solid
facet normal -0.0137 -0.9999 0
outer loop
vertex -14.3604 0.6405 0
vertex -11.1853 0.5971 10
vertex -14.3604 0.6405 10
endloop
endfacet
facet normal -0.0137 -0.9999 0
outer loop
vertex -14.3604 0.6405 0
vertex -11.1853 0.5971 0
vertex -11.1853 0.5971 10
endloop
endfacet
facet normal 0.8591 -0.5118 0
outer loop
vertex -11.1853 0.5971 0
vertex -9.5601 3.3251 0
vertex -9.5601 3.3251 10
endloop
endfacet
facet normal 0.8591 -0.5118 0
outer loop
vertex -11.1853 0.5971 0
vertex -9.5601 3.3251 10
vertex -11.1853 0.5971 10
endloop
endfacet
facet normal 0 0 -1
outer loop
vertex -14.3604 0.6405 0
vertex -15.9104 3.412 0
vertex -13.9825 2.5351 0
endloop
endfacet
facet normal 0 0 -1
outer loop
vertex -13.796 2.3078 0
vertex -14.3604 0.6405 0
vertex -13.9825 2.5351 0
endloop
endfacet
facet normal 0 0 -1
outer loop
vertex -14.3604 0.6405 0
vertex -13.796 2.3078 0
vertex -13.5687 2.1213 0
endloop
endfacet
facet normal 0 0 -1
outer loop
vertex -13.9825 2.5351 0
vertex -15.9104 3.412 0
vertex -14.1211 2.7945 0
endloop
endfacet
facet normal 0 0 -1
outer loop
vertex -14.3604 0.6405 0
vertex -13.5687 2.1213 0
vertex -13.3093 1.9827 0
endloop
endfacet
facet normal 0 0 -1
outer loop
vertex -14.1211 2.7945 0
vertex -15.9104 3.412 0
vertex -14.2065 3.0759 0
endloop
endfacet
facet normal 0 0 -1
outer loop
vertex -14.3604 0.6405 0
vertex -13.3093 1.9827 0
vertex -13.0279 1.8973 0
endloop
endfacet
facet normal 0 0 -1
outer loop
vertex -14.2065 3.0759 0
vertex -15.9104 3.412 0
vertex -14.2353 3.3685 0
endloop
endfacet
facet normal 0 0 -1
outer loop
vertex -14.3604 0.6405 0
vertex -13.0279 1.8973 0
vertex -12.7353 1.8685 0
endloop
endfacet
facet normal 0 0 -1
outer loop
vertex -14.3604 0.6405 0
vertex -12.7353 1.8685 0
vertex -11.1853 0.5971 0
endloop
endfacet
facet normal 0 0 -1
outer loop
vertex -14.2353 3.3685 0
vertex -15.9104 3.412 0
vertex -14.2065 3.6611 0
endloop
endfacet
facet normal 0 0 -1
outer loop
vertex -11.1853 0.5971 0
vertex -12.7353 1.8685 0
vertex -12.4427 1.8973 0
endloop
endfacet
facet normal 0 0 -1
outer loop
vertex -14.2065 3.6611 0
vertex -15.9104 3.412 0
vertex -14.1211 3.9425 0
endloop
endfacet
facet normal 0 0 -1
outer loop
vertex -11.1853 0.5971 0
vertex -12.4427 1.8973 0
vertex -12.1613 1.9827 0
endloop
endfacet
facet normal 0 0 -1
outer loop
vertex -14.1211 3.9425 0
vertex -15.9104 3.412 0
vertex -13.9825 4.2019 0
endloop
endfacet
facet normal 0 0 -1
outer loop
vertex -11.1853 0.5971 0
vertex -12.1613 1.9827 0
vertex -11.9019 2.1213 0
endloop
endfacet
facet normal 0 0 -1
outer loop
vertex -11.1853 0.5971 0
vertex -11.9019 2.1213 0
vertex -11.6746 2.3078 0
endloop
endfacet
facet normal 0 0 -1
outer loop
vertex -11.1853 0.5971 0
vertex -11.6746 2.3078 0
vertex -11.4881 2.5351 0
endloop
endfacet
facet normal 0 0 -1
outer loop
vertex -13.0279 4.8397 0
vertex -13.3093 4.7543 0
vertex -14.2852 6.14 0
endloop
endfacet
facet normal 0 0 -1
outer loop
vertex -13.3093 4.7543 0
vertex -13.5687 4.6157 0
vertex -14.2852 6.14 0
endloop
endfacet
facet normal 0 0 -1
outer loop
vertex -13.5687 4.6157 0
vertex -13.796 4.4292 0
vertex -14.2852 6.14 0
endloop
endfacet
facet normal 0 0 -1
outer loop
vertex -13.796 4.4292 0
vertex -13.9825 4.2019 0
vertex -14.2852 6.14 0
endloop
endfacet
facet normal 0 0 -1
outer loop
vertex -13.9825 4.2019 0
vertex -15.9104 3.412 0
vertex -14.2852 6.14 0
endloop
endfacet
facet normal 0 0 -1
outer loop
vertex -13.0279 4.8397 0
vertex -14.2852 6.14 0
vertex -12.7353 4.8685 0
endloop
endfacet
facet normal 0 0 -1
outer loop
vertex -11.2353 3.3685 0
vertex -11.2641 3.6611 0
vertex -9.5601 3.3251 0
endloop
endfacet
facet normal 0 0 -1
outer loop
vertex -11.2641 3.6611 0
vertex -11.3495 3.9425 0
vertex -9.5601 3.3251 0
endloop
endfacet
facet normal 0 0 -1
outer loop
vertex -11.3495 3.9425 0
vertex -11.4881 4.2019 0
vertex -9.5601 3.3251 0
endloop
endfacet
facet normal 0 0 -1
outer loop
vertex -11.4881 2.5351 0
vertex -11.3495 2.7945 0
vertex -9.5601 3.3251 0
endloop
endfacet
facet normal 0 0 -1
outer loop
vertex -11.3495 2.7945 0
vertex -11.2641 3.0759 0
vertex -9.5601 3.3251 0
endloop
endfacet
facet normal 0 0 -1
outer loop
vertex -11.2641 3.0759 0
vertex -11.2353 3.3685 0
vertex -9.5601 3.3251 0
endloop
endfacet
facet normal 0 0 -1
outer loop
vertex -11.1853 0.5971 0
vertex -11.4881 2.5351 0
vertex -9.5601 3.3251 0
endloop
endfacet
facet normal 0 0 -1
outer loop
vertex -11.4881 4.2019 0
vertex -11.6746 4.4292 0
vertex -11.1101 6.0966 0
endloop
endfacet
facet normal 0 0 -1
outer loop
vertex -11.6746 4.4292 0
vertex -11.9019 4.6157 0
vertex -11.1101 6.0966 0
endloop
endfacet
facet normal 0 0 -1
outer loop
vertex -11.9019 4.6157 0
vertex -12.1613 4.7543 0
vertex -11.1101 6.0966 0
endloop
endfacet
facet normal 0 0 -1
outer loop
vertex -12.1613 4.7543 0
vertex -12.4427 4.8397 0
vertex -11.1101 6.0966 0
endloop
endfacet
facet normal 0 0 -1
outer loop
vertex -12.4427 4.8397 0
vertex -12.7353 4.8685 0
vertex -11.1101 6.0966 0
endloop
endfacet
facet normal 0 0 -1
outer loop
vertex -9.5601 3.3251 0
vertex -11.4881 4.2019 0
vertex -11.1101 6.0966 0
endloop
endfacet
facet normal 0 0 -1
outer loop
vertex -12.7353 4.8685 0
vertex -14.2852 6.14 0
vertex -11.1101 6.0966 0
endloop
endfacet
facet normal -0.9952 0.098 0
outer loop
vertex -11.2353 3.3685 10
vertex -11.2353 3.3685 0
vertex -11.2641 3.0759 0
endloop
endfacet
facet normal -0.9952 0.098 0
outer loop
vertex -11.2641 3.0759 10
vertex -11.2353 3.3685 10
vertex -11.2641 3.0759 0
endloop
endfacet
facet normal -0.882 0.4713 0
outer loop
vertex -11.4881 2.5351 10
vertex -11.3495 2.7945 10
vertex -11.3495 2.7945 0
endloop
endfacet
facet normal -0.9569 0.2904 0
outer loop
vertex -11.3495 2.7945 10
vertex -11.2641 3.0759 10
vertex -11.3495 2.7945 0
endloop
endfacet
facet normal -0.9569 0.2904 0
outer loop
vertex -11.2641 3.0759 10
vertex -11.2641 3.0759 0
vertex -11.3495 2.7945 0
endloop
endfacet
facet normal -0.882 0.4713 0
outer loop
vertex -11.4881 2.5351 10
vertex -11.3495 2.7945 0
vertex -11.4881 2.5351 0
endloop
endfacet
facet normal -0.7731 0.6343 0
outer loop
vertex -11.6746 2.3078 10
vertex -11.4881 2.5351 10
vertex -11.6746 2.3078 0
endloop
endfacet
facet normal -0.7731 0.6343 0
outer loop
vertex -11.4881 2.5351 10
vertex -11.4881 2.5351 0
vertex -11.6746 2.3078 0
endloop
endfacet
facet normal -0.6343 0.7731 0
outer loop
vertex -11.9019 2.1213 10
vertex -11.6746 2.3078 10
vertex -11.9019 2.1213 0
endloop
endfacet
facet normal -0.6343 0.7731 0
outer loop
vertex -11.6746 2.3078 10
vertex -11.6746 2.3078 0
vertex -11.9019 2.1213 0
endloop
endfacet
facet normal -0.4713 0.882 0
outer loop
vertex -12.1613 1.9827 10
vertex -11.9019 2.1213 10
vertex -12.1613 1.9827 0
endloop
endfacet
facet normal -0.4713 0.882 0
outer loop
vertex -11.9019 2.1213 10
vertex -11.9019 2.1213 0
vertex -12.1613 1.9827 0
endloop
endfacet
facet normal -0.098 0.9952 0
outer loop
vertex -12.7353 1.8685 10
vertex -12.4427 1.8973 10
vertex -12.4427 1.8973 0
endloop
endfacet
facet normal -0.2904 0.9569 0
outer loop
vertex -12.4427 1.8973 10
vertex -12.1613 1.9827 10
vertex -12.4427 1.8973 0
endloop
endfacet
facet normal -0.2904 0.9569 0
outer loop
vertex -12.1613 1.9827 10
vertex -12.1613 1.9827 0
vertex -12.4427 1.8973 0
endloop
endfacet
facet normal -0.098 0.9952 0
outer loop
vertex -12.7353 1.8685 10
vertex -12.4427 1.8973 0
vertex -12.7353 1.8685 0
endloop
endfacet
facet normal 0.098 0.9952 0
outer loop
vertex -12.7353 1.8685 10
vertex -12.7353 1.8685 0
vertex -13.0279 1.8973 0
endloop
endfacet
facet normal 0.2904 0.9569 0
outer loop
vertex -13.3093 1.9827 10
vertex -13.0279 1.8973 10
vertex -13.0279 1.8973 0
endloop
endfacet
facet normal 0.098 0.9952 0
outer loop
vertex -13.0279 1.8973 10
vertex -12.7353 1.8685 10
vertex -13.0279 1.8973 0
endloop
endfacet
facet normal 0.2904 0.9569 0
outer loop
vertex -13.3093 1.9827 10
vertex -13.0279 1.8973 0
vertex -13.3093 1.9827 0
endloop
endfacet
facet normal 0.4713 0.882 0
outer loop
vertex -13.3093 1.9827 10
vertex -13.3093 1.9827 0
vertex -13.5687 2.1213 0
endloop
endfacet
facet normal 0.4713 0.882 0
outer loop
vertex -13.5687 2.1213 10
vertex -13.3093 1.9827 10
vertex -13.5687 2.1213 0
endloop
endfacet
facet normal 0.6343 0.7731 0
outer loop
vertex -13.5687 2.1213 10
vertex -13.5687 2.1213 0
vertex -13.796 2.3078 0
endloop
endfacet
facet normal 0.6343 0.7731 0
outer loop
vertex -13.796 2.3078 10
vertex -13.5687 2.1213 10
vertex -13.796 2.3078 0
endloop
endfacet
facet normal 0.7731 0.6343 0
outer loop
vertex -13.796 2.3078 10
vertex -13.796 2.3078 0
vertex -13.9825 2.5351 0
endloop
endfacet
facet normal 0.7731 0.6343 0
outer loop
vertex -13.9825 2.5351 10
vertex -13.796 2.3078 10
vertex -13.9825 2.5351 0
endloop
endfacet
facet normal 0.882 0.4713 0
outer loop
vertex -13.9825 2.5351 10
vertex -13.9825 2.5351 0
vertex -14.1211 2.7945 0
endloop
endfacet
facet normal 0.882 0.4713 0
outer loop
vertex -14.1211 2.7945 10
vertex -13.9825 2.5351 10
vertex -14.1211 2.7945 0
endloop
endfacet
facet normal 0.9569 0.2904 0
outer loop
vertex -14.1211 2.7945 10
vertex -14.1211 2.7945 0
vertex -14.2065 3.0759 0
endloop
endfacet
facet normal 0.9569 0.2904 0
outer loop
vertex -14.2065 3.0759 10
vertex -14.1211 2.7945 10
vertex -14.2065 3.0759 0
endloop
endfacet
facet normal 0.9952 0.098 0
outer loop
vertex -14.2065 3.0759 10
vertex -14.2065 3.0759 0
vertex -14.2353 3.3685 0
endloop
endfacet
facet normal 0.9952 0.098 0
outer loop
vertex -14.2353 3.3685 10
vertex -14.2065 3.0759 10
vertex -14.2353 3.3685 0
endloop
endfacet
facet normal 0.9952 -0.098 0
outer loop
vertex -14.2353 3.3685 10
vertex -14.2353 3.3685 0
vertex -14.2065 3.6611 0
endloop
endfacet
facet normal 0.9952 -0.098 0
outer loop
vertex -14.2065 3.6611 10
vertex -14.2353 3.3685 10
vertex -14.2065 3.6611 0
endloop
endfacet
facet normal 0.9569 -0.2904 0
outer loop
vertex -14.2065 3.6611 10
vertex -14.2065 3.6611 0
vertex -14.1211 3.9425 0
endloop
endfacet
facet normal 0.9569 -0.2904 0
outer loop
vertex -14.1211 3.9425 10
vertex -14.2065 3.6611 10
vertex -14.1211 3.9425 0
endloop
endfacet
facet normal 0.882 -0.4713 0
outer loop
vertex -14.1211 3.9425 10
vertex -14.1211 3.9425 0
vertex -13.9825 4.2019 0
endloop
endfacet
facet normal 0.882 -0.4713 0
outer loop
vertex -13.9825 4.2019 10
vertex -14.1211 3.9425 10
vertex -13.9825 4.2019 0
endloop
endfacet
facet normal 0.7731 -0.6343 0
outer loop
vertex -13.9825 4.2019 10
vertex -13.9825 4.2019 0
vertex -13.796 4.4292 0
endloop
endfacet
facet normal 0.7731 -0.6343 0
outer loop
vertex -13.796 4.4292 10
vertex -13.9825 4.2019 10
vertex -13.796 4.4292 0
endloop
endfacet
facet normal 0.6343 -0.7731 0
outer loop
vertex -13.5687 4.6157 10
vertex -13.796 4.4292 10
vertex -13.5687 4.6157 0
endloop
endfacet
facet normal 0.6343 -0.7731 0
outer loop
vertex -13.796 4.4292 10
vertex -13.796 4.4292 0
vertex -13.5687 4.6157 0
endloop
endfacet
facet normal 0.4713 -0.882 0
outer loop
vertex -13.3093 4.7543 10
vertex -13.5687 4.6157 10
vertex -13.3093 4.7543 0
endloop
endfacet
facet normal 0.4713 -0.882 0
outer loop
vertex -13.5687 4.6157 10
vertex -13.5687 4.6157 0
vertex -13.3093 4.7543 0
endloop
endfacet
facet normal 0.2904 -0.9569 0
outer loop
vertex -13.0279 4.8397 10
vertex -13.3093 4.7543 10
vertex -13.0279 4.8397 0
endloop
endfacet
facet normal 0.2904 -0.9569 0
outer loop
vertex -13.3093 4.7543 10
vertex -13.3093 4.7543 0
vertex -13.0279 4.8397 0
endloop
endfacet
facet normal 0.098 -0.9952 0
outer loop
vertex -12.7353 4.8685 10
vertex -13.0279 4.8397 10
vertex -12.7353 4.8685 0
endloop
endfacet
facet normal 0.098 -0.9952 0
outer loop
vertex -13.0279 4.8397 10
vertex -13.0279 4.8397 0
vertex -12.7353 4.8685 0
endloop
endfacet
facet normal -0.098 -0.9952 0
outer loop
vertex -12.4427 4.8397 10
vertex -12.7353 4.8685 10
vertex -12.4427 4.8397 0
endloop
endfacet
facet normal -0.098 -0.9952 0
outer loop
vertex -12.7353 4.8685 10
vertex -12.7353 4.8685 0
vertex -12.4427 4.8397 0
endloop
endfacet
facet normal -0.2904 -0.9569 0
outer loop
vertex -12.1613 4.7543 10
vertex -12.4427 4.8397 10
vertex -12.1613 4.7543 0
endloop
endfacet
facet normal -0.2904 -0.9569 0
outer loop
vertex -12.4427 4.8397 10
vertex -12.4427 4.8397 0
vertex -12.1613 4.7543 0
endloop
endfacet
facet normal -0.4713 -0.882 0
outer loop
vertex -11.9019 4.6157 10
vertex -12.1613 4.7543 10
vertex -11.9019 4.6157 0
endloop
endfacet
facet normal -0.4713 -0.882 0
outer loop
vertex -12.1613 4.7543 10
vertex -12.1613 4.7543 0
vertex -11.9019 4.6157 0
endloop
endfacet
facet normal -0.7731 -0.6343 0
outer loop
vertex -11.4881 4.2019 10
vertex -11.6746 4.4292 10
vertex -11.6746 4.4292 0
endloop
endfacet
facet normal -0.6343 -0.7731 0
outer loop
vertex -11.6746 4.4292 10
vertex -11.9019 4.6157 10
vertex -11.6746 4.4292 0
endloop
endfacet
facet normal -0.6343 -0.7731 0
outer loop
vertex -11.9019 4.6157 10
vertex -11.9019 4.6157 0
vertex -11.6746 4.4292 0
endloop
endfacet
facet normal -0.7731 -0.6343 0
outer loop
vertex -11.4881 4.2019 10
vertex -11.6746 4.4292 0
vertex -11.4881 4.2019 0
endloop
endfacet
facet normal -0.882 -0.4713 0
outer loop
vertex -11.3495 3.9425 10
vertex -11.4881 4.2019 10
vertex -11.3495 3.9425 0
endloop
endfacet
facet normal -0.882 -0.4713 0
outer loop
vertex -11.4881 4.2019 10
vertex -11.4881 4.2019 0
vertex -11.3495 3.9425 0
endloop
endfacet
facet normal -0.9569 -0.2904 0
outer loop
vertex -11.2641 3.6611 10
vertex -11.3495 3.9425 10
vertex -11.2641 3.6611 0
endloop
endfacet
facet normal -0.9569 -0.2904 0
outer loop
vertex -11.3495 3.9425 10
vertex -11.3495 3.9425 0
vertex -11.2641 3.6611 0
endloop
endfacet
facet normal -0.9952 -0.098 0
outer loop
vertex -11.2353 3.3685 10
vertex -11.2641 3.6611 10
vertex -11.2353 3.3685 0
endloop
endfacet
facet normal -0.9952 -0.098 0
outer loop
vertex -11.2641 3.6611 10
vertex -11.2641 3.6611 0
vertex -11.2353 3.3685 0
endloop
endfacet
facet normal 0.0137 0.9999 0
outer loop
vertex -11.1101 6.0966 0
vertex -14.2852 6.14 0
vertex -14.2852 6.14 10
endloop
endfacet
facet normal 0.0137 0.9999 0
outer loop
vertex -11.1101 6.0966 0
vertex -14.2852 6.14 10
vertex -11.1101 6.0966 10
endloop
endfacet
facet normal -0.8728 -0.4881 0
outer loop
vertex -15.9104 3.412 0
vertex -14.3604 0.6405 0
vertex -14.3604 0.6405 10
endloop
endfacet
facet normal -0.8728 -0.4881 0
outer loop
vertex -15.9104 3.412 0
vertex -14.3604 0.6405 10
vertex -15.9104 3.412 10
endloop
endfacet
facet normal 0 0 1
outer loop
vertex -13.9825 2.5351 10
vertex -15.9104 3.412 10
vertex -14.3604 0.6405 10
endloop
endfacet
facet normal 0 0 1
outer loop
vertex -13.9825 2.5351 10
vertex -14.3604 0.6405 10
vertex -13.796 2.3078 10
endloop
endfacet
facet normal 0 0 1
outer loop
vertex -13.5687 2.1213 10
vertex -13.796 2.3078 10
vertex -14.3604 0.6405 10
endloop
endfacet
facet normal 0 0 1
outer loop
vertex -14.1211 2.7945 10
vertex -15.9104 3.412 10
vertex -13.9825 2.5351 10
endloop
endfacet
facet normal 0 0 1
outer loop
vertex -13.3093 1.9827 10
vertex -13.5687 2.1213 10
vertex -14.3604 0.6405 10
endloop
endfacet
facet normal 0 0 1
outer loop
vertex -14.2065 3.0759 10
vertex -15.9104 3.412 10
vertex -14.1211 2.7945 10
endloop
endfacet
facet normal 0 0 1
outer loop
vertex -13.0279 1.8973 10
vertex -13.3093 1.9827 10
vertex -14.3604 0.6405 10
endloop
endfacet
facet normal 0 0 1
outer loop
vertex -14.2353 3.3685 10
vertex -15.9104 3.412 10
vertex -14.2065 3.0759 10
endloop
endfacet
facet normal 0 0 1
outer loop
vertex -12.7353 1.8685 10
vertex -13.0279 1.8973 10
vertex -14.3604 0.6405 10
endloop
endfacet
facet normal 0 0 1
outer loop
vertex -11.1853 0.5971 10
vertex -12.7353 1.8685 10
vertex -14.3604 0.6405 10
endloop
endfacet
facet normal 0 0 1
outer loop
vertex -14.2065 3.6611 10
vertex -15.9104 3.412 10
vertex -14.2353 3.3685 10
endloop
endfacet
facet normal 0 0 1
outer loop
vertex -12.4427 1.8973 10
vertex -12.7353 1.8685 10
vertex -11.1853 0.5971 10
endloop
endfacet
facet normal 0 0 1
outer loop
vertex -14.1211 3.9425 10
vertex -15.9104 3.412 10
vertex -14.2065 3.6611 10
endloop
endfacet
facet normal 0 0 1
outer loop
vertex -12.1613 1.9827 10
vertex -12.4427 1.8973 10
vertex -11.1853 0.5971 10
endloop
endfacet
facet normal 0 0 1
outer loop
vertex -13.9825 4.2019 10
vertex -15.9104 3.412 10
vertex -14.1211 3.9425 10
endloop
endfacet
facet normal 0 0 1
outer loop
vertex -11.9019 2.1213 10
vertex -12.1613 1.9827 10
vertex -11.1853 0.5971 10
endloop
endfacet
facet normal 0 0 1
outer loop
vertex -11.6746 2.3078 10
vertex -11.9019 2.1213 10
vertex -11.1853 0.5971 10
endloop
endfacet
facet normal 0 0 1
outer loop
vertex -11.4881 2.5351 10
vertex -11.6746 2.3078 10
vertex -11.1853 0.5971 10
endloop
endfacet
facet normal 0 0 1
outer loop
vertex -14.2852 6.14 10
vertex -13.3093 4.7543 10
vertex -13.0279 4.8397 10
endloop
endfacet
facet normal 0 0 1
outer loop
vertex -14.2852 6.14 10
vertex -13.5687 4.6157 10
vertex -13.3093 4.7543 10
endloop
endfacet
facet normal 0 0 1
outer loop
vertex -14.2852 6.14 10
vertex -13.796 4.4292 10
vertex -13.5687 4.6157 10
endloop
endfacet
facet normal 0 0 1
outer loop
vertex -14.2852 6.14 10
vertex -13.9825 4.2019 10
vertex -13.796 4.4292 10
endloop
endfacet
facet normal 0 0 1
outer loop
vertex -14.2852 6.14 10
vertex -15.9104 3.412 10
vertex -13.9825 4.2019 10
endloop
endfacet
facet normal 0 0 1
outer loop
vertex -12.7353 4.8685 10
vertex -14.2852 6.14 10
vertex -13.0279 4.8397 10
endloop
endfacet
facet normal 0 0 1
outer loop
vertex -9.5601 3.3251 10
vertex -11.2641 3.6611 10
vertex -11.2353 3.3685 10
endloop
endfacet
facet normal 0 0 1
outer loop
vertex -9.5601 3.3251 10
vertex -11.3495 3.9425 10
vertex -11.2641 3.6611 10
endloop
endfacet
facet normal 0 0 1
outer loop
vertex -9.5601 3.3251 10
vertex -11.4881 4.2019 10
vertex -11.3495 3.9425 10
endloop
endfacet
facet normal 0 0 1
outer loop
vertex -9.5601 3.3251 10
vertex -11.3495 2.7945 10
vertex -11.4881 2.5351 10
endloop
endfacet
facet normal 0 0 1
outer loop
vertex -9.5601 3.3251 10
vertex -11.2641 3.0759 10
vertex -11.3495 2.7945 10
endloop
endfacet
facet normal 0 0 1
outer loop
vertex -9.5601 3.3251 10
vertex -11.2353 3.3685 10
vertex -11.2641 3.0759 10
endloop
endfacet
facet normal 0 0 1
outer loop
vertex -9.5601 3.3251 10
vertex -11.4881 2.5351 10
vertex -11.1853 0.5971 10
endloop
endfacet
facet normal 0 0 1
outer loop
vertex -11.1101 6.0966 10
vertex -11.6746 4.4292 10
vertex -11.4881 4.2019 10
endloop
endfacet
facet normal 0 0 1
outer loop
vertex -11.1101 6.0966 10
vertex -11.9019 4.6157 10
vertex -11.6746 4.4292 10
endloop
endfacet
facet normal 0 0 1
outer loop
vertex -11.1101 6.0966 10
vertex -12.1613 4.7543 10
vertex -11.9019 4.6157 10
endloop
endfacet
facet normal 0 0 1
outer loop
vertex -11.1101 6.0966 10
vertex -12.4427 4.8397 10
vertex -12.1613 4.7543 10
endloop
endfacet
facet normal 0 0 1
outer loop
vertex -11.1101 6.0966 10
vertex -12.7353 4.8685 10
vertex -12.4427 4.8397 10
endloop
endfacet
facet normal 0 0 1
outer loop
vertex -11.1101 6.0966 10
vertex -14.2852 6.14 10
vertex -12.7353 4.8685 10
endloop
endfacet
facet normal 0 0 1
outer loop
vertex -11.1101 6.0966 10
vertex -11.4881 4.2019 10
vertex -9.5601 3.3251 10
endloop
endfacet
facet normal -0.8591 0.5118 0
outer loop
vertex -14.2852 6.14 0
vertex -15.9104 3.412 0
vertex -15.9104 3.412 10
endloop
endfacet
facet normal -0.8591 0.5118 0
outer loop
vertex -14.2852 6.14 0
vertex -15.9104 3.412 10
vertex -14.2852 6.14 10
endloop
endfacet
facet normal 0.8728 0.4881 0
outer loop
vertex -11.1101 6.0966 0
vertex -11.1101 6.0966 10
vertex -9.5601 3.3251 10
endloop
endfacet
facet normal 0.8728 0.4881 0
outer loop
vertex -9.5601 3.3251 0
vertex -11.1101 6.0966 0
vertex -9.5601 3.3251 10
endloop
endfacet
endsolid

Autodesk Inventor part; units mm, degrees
ref_plane "YZ Plane" through (0, 0, 0) normal (1, 0, 0) x (0, 1, 0)
ref_plane "XZ Plane" through (0, 0, 0) normal (0, 1, 0) x (-1, 0, 0)
ref_plane "XY Plane" through (0, 0, 0) normal (0, 0, 1) x (1, 0, 0)
sketch "Sketch1" plane through (0, 0, 0) normal (0, 0, 1) x (1, 0, 0)
  line L0 (-11.1101, 6.0966) -> (-9.5601, 3.3251)
  line L1 (-9.5601, 3.3251) -> (-11.1853, 0.5971)
  line L2 (-11.1853, 0.5971) -> (-14.3604, 0.6405)
  line L3 (-14.3604, 0.6405) -> (-15.9104, 3.412)
  line L4 (-15.9104, 3.412) -> (-14.2852, 6.14)
  line L5 (-14.2852, 6.14) -> (-11.1101, 6.0966)
  circle A0 centre (-12.7353, 3.3685) radius 1.5
  dimension "d0" = 5.5
  dimension "d1" = 3
extrude "Extrusion1" add sketch "Sketch1" along normal blind 10
thread "Thread2" size "M3x0.5" class "6H" standard "ANSI Metric M Profile" length 5
thread "Thread3" size "M3x0.5" class "6H" standard "ANSI Metric M Profile" length 5
properties part number "Espaciador para Electrónica 10mm" material "Acetal Resin, White"
